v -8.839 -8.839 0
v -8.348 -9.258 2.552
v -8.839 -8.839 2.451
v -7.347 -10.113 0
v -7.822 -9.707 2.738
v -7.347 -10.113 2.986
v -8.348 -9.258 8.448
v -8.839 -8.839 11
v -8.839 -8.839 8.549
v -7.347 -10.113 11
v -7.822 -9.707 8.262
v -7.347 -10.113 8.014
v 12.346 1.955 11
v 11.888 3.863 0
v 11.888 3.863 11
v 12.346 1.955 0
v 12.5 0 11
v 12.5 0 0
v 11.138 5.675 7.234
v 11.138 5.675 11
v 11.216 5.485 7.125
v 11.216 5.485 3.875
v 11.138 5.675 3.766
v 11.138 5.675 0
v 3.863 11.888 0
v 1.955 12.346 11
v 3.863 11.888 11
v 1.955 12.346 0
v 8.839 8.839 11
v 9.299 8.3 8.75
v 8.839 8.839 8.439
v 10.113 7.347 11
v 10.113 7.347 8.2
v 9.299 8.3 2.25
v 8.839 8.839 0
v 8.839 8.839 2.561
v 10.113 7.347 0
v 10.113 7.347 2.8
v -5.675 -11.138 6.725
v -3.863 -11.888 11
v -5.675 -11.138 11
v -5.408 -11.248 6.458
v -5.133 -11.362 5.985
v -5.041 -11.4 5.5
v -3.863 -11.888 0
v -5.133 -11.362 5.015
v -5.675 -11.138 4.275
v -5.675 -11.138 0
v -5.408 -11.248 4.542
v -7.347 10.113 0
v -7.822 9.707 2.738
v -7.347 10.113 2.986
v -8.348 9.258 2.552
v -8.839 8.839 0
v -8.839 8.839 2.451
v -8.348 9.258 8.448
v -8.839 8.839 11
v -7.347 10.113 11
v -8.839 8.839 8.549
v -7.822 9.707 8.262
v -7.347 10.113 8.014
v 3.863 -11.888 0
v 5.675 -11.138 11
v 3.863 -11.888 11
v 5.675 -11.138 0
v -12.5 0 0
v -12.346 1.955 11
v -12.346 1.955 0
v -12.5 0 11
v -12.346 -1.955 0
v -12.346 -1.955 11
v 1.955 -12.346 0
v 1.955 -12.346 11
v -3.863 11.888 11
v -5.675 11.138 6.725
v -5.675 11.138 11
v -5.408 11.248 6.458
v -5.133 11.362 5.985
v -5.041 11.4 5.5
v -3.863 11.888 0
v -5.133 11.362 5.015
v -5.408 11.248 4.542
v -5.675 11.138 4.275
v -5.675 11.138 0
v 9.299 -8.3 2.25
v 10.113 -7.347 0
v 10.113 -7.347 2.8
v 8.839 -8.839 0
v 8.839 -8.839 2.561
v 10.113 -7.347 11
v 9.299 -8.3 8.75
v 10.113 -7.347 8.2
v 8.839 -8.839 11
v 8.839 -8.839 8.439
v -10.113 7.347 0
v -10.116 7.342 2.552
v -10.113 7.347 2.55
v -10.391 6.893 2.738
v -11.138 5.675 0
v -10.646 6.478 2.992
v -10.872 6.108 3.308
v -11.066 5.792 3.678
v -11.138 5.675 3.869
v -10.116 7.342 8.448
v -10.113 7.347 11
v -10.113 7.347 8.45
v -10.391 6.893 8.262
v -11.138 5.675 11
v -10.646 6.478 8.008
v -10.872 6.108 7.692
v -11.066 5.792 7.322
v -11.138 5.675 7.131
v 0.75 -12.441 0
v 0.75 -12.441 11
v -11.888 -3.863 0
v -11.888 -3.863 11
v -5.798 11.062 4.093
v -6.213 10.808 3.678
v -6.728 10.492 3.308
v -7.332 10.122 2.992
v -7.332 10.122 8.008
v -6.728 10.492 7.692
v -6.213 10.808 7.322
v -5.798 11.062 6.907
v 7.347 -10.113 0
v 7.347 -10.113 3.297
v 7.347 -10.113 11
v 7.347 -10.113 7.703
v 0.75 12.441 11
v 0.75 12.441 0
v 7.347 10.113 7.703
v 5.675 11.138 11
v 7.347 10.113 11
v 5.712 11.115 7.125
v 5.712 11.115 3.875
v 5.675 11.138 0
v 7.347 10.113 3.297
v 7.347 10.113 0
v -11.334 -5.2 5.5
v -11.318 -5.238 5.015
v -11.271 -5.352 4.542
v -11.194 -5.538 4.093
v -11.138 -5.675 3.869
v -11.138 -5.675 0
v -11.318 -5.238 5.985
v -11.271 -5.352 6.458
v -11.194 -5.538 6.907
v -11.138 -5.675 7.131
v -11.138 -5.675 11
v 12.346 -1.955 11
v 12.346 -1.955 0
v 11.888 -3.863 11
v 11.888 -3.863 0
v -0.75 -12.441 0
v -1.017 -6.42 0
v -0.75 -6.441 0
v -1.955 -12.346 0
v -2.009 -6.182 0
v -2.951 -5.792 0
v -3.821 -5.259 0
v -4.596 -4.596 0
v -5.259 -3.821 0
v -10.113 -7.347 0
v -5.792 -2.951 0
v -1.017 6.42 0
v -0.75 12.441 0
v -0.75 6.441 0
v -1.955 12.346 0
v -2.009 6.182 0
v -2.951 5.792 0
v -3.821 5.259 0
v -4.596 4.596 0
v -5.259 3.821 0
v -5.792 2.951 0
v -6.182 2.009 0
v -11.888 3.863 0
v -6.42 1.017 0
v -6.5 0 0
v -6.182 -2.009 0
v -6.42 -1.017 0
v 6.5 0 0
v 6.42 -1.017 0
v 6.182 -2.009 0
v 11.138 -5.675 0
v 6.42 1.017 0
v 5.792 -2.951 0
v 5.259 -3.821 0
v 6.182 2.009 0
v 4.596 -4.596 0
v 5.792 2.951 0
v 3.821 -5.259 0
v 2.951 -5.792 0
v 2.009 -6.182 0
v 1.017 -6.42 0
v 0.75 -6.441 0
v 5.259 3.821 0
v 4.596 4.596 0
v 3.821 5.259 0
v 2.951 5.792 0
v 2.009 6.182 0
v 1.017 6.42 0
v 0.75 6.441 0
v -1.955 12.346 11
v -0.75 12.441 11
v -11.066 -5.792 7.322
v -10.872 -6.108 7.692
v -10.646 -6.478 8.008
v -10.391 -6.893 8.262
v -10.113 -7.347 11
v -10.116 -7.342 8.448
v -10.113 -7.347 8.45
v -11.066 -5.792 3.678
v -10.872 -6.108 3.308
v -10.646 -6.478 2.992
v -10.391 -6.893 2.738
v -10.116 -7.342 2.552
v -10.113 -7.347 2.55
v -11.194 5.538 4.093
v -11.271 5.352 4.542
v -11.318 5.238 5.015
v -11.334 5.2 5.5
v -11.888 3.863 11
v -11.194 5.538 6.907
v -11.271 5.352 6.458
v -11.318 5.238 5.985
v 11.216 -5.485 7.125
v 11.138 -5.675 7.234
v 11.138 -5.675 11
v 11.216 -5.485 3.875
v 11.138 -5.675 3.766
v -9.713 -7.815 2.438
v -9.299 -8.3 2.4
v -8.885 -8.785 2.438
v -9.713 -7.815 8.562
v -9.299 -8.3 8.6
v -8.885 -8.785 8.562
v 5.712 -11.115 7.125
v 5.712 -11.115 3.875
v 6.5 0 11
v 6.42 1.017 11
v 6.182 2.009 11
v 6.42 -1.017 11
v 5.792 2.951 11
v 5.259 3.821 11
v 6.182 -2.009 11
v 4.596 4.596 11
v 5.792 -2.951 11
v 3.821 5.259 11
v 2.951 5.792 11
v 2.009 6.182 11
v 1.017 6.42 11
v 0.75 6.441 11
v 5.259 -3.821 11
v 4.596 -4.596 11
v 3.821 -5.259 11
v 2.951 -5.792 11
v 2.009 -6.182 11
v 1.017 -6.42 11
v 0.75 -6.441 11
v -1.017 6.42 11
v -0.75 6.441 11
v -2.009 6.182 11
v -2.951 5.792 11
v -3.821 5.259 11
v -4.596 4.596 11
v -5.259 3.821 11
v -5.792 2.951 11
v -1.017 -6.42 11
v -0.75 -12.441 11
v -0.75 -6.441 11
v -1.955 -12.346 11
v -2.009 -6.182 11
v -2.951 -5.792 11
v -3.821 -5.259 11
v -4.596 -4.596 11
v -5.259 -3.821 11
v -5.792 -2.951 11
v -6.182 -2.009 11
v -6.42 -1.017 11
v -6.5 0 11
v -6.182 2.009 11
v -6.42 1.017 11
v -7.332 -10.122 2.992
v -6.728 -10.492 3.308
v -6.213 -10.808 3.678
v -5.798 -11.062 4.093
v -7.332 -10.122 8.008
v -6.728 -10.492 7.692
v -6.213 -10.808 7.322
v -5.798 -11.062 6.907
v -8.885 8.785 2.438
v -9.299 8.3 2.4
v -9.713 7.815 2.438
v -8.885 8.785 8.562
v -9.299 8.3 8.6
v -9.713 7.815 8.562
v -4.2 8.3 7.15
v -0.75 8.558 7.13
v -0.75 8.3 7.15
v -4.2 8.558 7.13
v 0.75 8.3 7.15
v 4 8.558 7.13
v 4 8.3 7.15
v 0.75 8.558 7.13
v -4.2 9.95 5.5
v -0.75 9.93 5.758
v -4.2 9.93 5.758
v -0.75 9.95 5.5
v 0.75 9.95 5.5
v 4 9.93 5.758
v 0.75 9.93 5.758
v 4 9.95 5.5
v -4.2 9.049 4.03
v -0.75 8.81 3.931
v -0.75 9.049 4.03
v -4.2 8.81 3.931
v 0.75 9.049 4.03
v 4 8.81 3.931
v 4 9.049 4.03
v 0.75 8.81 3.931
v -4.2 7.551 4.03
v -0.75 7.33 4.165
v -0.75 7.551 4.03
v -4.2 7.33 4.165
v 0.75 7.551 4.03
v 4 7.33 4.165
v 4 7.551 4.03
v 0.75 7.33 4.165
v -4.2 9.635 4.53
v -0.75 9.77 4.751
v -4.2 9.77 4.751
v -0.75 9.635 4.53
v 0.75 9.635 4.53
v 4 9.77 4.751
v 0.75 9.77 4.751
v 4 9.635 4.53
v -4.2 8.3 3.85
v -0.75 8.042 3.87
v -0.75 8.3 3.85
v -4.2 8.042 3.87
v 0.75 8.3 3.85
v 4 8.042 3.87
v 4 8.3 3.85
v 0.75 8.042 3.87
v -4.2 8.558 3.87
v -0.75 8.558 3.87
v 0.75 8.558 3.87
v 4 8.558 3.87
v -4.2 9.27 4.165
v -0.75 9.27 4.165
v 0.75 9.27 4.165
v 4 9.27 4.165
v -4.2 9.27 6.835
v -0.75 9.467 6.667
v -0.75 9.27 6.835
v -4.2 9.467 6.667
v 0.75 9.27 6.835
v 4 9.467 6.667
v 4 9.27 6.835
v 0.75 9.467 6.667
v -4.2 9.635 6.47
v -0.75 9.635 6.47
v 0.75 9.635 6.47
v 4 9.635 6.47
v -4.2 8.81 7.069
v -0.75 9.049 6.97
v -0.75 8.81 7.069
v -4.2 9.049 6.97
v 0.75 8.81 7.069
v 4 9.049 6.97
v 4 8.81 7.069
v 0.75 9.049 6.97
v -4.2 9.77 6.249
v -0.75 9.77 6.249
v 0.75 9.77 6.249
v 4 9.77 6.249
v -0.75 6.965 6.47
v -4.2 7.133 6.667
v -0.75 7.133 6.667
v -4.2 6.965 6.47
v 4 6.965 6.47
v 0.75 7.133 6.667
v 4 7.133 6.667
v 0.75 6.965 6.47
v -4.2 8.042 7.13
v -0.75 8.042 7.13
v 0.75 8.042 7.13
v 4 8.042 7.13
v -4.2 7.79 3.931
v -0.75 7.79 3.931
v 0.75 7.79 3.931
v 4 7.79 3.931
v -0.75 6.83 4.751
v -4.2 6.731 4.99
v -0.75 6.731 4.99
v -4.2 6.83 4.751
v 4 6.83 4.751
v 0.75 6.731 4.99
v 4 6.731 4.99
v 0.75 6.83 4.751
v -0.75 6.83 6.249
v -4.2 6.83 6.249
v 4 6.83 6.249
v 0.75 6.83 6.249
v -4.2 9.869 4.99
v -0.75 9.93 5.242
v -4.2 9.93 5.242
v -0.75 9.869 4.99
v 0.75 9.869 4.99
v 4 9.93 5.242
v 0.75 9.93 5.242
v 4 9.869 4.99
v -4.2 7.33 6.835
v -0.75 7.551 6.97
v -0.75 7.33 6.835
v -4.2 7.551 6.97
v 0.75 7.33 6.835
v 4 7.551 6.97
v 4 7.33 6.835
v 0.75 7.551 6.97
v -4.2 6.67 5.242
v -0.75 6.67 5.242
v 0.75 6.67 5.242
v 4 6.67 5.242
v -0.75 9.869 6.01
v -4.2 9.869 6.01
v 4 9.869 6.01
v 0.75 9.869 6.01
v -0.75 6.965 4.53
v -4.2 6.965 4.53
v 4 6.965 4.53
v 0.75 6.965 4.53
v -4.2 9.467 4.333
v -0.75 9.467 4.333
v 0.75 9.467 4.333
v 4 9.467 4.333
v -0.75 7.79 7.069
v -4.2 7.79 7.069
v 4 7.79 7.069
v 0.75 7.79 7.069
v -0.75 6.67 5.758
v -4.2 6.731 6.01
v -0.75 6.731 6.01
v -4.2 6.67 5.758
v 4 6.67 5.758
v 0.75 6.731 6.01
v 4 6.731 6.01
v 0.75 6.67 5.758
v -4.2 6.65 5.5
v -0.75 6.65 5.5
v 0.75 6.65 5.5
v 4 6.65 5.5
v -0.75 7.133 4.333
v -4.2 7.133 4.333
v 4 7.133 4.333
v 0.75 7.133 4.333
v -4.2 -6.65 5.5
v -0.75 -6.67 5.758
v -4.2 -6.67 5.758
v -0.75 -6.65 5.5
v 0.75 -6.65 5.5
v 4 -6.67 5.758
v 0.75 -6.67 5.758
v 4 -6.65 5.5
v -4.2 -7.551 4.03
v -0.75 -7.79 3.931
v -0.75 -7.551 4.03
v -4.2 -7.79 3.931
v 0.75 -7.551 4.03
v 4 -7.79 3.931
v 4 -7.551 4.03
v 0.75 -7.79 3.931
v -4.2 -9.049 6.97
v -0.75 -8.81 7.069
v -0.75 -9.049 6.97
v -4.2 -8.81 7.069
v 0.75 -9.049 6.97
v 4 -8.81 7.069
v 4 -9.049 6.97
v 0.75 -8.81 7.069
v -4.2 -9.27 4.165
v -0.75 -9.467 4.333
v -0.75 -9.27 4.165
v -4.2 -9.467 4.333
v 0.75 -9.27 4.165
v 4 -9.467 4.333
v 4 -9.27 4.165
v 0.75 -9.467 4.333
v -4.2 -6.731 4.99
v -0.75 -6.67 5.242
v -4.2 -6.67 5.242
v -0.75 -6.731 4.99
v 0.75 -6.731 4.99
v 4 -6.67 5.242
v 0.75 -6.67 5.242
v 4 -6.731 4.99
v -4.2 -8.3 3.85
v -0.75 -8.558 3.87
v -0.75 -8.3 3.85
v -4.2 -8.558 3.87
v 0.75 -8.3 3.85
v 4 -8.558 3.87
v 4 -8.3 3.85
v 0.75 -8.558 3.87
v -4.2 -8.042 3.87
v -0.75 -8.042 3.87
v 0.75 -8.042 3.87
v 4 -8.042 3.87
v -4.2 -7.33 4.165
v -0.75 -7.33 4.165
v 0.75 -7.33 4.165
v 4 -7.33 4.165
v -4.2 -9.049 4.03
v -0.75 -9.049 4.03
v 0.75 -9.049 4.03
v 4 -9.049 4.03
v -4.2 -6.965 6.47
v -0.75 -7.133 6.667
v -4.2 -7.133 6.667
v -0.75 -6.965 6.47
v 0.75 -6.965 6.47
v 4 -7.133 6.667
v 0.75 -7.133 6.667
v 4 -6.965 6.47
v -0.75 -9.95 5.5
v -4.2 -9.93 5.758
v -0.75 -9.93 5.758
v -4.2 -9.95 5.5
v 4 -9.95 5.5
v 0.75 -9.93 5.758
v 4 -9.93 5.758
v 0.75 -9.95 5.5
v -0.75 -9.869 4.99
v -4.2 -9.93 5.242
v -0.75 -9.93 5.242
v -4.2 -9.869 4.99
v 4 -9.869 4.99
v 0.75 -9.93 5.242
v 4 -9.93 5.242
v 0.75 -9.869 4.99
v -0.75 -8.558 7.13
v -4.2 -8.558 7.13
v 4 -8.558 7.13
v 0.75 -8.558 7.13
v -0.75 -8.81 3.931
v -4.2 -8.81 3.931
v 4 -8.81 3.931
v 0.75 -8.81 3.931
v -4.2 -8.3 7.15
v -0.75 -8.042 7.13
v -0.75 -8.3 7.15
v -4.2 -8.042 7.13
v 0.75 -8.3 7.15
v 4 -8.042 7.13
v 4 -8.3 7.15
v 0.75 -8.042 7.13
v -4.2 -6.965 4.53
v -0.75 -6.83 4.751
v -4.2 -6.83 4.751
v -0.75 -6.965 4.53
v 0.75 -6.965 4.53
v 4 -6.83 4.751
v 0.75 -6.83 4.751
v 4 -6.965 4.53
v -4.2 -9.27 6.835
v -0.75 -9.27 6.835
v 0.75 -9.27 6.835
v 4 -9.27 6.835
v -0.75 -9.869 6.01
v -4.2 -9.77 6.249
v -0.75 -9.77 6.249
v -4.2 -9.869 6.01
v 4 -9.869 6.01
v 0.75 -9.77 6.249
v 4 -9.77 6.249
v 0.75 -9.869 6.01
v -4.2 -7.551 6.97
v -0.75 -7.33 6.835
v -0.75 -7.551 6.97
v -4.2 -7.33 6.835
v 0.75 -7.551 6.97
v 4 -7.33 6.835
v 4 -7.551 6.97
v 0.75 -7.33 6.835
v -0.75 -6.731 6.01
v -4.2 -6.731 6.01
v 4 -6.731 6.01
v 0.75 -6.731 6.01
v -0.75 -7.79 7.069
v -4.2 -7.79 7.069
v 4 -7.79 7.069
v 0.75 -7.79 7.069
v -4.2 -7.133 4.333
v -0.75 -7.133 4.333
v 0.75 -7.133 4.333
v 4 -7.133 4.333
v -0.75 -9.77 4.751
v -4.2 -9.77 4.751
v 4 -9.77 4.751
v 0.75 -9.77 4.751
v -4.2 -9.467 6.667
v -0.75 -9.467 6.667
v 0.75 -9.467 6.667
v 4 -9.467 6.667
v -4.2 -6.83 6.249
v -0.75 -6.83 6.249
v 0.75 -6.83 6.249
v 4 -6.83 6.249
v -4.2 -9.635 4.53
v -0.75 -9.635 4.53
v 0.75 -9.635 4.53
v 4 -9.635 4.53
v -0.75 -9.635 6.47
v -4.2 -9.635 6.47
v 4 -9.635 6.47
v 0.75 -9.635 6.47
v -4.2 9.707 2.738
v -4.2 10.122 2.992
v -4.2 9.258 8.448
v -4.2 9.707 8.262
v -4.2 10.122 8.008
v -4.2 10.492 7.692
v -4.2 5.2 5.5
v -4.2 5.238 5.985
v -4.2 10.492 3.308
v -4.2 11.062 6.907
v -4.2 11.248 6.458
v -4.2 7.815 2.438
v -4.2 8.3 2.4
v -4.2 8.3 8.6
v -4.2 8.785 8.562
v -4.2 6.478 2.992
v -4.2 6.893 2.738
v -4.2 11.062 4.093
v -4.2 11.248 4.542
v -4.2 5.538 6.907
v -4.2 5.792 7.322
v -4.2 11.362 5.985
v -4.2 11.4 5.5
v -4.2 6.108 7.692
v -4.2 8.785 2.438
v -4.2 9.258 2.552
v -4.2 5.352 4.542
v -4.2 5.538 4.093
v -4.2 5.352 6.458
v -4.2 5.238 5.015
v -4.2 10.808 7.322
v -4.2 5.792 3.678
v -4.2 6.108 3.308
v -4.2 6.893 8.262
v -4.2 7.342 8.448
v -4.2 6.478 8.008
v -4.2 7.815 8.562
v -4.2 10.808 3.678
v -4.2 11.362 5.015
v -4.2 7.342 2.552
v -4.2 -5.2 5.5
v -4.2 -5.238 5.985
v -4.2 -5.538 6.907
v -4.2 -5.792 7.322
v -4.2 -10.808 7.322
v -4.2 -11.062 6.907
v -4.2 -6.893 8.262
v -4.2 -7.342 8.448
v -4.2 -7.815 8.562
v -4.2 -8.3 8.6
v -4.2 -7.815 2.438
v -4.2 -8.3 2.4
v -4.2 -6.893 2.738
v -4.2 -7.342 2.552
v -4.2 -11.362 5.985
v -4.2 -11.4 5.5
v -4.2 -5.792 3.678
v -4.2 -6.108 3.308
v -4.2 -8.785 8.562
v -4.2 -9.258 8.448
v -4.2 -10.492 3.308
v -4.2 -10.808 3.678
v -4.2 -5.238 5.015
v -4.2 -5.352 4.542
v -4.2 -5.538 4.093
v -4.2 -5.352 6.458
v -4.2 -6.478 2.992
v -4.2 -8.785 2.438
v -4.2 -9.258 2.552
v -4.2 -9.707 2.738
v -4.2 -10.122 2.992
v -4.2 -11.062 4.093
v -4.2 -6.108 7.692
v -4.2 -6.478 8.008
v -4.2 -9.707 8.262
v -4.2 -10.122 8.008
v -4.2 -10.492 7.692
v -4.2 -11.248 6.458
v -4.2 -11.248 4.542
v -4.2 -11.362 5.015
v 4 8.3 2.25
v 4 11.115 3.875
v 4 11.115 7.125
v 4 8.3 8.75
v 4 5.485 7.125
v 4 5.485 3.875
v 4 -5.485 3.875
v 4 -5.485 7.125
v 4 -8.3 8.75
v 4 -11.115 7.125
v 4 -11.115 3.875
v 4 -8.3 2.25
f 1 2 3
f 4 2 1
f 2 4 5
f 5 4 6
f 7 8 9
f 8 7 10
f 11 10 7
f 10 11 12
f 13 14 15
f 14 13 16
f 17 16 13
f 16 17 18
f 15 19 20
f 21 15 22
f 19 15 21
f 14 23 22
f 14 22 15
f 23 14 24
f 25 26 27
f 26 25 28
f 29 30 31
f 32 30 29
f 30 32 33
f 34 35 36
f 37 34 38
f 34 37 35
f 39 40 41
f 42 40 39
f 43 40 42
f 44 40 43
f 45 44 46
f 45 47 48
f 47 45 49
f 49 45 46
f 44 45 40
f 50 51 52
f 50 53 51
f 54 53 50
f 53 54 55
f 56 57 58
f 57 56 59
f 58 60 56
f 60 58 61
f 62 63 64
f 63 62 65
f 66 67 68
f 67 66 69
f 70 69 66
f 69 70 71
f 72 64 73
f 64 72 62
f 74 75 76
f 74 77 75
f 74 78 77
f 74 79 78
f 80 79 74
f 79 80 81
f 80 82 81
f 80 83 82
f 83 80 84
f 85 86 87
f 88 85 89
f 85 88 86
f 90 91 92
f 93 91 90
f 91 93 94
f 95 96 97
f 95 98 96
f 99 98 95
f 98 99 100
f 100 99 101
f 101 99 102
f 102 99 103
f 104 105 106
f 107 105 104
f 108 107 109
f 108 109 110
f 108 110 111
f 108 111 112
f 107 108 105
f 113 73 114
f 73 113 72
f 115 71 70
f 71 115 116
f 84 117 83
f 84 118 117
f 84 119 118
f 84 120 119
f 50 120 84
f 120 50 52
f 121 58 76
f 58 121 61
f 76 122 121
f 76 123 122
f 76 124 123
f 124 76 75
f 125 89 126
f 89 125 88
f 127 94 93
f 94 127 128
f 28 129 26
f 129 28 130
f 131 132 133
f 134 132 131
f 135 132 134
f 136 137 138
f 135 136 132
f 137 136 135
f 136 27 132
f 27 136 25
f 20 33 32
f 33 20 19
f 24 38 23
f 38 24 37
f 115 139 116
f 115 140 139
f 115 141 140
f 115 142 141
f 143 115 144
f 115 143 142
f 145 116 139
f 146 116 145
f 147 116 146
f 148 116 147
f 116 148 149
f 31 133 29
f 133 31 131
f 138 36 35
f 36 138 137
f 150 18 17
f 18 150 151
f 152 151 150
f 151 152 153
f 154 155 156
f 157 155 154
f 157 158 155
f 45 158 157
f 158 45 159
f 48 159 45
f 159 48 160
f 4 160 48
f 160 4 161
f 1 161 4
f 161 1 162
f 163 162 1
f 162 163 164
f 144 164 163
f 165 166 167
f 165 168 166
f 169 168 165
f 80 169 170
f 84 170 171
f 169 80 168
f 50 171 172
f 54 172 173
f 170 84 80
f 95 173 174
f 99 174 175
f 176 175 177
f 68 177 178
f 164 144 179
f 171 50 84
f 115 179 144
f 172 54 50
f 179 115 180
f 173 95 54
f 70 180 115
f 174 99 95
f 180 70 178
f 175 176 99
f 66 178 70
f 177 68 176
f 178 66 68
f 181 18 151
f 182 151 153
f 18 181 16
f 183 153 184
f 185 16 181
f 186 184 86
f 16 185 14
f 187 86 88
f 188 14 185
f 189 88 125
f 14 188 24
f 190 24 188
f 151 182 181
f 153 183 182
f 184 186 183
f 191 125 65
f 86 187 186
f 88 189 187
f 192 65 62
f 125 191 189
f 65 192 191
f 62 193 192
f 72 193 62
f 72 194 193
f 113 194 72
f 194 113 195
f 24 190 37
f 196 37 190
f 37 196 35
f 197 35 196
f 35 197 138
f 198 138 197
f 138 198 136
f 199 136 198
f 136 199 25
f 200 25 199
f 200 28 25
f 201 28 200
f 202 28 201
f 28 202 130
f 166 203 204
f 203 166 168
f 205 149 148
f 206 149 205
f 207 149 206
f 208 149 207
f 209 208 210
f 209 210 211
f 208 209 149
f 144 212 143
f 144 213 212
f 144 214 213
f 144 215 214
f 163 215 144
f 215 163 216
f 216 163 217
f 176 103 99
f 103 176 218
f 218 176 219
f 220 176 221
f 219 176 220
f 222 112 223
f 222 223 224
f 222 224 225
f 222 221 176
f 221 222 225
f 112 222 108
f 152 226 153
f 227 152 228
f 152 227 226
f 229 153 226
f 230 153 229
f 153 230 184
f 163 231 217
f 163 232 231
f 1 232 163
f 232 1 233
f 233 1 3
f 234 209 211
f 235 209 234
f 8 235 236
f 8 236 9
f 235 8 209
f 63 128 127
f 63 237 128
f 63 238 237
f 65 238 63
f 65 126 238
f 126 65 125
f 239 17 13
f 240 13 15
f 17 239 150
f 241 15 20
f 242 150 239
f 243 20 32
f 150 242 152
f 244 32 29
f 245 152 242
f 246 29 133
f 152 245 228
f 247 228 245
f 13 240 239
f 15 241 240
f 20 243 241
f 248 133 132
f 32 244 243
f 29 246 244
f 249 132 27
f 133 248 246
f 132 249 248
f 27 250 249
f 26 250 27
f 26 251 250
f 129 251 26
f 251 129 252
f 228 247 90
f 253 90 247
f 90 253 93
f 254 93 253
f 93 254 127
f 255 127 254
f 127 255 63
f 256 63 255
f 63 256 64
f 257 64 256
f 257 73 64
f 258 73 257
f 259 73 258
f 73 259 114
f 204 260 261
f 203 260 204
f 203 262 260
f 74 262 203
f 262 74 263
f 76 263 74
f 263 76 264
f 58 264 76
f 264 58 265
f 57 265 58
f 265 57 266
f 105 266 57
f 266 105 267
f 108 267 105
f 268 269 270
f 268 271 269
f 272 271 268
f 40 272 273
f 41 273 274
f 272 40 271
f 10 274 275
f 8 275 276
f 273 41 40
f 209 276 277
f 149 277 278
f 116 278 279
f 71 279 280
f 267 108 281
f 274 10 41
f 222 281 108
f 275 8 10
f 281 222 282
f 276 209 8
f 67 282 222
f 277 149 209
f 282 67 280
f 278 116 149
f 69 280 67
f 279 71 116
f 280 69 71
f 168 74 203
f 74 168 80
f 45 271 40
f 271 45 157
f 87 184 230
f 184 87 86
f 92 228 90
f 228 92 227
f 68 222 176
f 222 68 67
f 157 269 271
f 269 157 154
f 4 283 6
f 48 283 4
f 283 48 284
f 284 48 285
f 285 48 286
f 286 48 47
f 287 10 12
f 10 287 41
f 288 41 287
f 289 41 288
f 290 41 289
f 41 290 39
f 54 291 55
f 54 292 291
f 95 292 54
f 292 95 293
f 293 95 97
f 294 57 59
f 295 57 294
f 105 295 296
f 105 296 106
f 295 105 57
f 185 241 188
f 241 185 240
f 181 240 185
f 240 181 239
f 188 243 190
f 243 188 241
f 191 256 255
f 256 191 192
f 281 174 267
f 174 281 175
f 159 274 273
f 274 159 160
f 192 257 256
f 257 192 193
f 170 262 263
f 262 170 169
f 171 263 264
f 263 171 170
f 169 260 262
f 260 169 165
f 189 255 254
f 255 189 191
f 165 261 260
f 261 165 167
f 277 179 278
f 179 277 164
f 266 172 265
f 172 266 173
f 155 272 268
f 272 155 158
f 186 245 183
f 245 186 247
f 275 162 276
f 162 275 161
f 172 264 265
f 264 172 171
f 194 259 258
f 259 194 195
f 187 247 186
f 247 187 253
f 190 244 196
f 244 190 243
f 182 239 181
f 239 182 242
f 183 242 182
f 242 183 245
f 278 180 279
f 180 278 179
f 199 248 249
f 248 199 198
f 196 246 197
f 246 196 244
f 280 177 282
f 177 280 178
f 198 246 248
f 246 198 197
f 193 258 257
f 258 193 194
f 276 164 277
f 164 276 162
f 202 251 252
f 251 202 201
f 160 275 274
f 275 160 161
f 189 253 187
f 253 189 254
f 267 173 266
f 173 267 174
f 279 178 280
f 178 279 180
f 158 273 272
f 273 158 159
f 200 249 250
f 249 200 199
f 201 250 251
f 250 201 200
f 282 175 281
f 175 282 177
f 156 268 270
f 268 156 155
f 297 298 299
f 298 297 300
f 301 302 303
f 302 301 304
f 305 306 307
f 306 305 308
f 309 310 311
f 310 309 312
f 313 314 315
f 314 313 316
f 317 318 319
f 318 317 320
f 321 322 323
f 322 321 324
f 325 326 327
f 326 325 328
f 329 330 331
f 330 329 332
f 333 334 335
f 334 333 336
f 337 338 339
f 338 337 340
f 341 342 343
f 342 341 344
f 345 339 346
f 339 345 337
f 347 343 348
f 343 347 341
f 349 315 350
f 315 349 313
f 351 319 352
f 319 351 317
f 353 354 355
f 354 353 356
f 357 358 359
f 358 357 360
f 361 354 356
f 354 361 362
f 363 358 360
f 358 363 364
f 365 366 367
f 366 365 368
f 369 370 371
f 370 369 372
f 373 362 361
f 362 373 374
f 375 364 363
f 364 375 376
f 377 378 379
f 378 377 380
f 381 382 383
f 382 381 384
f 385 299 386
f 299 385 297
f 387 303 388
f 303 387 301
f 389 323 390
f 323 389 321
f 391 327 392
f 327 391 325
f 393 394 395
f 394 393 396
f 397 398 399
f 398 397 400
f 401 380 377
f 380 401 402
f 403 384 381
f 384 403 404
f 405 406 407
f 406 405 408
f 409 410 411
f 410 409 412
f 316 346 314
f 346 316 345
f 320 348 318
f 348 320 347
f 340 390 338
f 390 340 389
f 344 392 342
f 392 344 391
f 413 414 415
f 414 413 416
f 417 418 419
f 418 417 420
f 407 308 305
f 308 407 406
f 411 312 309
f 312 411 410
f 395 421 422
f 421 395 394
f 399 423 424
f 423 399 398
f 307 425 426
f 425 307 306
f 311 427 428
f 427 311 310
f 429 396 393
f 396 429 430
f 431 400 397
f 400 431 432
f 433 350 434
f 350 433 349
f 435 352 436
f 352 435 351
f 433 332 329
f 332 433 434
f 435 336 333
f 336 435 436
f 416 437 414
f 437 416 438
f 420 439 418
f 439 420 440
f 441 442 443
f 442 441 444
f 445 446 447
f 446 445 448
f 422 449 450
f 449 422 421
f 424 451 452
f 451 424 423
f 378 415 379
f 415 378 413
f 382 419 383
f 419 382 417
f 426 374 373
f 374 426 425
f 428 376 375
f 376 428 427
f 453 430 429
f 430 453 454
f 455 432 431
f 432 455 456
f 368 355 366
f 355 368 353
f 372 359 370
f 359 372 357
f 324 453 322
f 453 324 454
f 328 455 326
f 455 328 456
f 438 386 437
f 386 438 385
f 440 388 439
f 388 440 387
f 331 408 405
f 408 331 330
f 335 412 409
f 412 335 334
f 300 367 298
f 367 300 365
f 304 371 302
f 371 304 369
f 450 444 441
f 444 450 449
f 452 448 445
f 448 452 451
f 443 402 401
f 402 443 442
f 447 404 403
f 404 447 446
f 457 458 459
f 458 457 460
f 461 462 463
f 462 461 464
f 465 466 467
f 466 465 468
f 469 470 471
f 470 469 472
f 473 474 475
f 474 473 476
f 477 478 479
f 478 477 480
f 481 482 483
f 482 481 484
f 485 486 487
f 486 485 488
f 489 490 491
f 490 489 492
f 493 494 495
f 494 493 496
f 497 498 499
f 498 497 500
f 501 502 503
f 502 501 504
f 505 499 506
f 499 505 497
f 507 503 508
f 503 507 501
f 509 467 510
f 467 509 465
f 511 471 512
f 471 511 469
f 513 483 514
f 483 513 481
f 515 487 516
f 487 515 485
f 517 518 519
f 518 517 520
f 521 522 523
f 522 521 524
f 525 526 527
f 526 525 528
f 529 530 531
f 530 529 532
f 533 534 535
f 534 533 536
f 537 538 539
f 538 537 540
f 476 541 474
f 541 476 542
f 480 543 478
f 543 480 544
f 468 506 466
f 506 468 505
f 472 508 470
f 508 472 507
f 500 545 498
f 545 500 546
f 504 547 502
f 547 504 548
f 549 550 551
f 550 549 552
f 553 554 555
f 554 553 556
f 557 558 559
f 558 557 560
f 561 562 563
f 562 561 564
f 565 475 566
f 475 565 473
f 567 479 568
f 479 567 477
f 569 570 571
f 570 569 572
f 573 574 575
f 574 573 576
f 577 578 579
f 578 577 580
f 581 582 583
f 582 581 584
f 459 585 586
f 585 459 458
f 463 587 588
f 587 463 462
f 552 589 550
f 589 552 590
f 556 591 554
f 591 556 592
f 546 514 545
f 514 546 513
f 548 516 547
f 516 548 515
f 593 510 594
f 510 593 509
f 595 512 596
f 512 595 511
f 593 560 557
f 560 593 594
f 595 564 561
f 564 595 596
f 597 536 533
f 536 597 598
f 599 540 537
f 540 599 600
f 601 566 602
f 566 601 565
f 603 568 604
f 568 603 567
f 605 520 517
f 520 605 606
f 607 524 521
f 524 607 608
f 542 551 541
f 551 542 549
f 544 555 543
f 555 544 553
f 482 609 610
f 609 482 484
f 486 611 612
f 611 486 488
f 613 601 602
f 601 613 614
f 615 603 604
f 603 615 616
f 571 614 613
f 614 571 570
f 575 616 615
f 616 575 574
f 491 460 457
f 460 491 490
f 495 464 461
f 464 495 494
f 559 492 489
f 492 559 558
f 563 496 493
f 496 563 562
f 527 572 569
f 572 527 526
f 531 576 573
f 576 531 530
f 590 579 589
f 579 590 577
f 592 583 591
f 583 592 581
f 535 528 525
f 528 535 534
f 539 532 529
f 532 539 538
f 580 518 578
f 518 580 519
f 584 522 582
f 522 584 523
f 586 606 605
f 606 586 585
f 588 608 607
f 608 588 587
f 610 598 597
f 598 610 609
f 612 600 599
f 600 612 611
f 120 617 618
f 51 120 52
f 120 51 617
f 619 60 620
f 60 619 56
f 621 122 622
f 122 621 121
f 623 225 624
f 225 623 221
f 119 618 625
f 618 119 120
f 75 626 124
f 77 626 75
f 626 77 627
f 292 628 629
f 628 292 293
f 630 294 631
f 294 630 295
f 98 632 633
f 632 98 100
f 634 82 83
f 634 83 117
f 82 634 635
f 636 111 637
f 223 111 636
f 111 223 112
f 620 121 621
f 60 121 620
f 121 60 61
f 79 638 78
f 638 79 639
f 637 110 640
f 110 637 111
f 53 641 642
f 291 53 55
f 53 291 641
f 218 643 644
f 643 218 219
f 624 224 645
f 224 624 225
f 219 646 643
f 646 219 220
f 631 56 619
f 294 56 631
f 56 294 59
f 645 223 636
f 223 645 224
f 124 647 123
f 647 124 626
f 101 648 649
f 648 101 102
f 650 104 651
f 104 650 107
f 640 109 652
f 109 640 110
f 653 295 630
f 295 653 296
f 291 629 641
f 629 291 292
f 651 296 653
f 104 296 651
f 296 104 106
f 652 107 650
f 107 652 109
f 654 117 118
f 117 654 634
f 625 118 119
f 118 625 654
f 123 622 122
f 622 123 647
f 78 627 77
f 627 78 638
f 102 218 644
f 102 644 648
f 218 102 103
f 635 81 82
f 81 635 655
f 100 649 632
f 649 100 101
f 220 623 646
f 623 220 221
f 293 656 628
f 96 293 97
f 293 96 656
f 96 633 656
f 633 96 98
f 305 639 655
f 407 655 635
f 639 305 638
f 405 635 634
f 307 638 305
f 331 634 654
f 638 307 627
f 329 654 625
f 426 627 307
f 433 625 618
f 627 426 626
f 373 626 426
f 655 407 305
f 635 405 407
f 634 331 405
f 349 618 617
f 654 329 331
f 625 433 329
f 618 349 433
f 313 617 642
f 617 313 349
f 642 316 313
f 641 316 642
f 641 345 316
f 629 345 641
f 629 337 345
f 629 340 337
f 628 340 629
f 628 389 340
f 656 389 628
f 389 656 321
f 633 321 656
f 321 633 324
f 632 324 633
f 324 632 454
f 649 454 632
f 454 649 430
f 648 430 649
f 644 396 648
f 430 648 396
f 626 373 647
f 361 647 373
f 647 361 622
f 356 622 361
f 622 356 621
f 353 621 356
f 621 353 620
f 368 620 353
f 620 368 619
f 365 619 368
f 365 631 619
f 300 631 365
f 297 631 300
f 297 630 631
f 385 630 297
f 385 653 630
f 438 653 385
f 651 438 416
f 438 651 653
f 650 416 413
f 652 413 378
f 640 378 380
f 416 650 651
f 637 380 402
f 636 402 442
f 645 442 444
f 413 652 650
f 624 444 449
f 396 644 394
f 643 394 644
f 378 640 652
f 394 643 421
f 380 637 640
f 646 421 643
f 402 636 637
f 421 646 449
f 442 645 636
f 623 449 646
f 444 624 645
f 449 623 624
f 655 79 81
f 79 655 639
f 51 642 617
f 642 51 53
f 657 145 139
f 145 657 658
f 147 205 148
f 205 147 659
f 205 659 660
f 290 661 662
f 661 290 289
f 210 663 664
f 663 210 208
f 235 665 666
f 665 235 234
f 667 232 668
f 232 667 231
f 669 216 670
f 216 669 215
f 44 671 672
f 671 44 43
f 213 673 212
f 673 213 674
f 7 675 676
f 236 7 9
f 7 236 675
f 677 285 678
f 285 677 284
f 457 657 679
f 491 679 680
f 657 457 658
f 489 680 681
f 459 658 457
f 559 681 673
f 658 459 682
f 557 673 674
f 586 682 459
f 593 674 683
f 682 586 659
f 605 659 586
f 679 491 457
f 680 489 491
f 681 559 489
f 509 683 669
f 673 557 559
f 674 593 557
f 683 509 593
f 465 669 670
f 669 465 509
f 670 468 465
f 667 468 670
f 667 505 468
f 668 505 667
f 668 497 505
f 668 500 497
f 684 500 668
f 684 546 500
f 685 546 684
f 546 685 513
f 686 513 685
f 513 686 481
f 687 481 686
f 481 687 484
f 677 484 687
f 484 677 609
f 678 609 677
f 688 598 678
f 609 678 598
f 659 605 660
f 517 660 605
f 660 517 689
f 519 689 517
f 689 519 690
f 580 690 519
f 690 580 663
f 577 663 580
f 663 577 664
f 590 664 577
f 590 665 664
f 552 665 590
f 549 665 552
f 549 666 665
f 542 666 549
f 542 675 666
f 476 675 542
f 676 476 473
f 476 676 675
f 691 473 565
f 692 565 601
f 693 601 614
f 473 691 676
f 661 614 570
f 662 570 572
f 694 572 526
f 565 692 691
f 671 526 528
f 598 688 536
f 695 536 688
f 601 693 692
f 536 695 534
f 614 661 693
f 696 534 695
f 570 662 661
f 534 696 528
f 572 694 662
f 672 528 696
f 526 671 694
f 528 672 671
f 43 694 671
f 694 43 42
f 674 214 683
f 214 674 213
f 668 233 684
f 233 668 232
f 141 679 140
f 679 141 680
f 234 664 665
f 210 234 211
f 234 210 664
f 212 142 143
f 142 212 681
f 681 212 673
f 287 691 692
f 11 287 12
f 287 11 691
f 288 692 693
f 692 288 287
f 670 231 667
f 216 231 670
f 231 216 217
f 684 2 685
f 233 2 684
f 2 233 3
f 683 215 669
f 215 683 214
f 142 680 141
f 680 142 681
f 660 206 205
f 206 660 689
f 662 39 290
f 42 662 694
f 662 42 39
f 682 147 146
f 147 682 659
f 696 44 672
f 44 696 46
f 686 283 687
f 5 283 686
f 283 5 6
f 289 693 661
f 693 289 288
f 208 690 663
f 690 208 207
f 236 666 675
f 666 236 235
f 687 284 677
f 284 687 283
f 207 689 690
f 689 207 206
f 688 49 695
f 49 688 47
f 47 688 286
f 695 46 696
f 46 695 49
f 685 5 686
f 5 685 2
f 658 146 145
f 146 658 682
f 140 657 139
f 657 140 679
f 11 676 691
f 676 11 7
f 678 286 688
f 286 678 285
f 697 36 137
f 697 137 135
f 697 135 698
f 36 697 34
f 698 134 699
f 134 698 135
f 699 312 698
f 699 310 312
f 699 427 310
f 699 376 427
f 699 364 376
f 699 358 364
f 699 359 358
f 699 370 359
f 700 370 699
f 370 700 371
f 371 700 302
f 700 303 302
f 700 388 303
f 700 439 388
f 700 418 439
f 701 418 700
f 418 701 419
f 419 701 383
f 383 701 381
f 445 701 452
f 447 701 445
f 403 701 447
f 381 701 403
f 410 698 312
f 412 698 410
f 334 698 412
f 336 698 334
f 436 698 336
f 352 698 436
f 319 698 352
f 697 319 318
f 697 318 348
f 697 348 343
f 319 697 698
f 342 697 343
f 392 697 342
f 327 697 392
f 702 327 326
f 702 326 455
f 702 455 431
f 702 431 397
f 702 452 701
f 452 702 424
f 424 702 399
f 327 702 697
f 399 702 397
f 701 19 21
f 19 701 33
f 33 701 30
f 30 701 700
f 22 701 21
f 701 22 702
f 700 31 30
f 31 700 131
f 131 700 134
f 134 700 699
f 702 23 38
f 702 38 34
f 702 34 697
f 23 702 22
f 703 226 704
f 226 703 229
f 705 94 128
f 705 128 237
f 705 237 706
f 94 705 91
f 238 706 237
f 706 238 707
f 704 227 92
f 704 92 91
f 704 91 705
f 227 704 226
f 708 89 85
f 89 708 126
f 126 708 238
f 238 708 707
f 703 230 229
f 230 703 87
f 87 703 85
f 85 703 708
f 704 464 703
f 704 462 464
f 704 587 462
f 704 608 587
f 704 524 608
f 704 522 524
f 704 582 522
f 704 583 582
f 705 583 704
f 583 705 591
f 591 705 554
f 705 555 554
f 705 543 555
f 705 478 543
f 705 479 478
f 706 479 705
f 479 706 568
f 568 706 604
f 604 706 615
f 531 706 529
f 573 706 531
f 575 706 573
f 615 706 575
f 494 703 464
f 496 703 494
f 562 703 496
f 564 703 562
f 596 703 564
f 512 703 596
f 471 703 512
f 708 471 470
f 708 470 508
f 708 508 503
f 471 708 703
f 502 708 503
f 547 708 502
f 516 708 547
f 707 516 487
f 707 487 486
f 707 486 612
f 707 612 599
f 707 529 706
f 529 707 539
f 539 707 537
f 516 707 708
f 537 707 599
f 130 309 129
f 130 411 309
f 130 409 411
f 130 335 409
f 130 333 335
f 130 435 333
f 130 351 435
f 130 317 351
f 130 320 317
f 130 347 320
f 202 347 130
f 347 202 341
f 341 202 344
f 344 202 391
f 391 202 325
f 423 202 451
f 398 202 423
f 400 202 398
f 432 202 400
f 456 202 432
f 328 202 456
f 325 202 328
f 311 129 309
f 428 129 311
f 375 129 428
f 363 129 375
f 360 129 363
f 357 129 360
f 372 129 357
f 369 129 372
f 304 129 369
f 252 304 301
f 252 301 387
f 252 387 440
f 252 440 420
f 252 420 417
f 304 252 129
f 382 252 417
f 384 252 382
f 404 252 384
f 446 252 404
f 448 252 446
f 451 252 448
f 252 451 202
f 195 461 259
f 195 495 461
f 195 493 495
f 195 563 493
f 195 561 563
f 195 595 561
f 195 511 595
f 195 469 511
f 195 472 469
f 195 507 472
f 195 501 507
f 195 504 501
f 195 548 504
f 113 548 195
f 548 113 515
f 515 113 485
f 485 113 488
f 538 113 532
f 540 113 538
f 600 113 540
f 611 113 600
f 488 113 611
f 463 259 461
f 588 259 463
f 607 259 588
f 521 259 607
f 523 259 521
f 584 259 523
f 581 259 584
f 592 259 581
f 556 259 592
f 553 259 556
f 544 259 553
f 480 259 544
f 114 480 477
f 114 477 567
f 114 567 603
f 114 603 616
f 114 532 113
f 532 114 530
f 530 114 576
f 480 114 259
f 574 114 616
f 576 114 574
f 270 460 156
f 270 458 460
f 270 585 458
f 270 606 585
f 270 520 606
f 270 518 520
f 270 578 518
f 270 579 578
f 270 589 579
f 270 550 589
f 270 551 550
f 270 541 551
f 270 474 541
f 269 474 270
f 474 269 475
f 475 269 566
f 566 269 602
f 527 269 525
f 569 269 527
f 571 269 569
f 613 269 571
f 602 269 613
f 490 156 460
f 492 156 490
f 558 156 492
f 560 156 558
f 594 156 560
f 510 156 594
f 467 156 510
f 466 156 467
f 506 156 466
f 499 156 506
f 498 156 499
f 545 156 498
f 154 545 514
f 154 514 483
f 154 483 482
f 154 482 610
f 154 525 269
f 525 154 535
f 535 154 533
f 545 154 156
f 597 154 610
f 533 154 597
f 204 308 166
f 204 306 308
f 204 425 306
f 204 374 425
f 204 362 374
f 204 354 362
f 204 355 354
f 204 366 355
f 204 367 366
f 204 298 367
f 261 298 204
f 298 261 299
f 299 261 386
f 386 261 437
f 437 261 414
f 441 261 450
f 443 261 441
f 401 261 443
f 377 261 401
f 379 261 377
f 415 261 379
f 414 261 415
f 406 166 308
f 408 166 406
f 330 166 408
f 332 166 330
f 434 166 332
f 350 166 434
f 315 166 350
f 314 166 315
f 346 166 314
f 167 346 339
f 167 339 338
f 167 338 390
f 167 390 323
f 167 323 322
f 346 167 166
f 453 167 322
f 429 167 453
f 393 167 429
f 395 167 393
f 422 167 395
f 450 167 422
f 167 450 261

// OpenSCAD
// file: globals.scad
/*
Most things in this file is represented as one millimeter, so keep that in mind while changing things.
Some of the setting are not mm but at variables that you can set, such as 2*x=2x and you are setting what x is.
I will try to specify when things are variables and not exact measurements.
*/

// printer slop
slop = 0.15;

obj_leg = 30;
leg_length = 5.5;
small_number = 0.001;
metal_core_rode_global = 5;


///////////////// number of holes /////////////////////
z_hole_number = 8;
other_holes = 8;

///////////////// Pins /////////////////////

//pins that poke out
ball_size = 10;
pin_height = 20;
pin_diameter = 6;


//holes
hole_ball_size = ball_size;
hole_pin_height = pin_height;
hole_pin_diameter = pin_diameter;

///////////////// Z THINGS /////////////////////

berring_slot_width = 7.5;
berring_slot_depth = 6.5;
metal_core_rode = 5;

///////////////// X THINGS /////////////////////

//male dove tails
male_dove_max_width=8;
male_dove_min_width=5;
male_dove_depth=5;
male_dove_height=obj_leg/2;

function scaled_male_dove_max_width() = male_dove_max_width;
function scaled_male_dove_min_width() = male_dove_min_width - 0.5*slop;
function scaled_male_dove_depth() = male_dove_depth - .2;

//female dove tails, this is found on the y mounts
girl_max_width=11;
girl_min_width=5;
girl_depth=5;
girl_height=obj_leg;


///////////////// Y THINGS /////////////////////
/*
The Y is so normal that all of those global variables at the top should change all of the setting in it, this section is set her incase there are variables set in the future development of this project.
*/

// stepper
motor_side_length = 43.2;
motor_bolt_hole_distance = 31;
motor_center_hole = 23;
motor_shaft_dia = 5;
motor_shaft_hole_dia = 5;

// bolts etc.
bolt_hole_dia = 3+2*slop;
bolt_head_hole_dia = 6.2;

m4_bolt_hole_dia = 4+2*slop;
m4_bolt_head_hole_dia = 6.8+2*slop;

m3_nut_side = 5.65;
m3_nut_height = 2.3;
m4_nut_side = 6.85;
m4_nut_height = 3.1;

// threaded rod
lifter_rod_diam = 9.86;
hole_threaded_rod = lifter_rod_diam+2*slop;

// for the extensions
metal_rod_size = 9;

// z screw
z_screw_d = 25;

// stabilizer
pin_bolt_dia = 12-2*slop;
pin_bolt_dia_minus = 12+2*slop;

clip_bolt_dia = 10-2*slop;
clip_bolt_dia_minus = 10+2*slop;
// main file
include <globals.scad>;
include <include.scad>;

$fn=40;

height = 32;

// A rigid clamp for leadscrew. Uses 3mm bolts and nuts to tighten
module rigid_leadscrew_coupler () {
    module body() {
        union() {
            difference() {
                cylinder(d=30, h=height);
                translate([0,0,height/2]) cylinder(d=hole_threaded_rod, h=height/2+1);
                motor_shaft(height/2+1);
                // bolt holes
                translate([-height/2,9,5]) rotate([0,90,0]) cylinder(d=bolt_hole_dia, h=height);
                translate([-height/2,-9,5]) rotate([0,90,0]) cylinder(d=bolt_hole_dia, h=height);
            
                translate([9,height/2,27]) rotate([90,0,0]) cylinder(d=bolt_hole_dia, h=height);
                translate([-9,height/2,27]) rotate([90,0,0]) cylinder(d=bolt_hole_dia, h=height);

                // bolt head holes
                translate([-height/2,9,5]) rotate([0,90,0]) cylinder(d=bolt_head_hole_dia, h=9);
                translate([-height/2,-9,5]) rotate([0,90,0]) cylinder(d=bolt_head_hole_dia, h=9);
            
                translate([9,height/2,27]) rotate([90,0,0]) cylinder(d=bolt_head_hole_dia, h=9);
                translate([-9,height/2,27]) rotate([90,0,0]) cylinder(d=bolt_head_hole_dia, h=9);

                // nut holes
                translate([8,9,5]) rotate([0,90,0]) M3_nut(6);
                translate([8,-9,5]) rotate([0,90,0]) M3_nut(6);

                translate([9,-8,27]) rotate([90,0,0]) M3_nut(6);
                translate([-9,-8,27]) rotate([90,0,0]) M3_nut(6);
            }
            
        }
        
        module throat() {
            translate([-0.7,4.2,height/2+1]) rotate([-5,0,0]) cube([1,3,10]);
        }
        rotate([0,0,45]) throat();
        rotate([0,0,135]) throat();
        rotate([0,0,225]) throat();
        rotate([0,0,315]) throat();
            
    }

    difference() {
        body();
        translate([-1,-height/2,0]) cube([2, height, height/2]);
        translate([-height/2,-1,height/2]) cube([height, 2, height/2]);
    }
}

// Flexible coupler motor shaft adapter. 10mm outer diameter
module motor_shaft_adapter() {
    difference() {
        ridged_cylinder(d=10, h=15, r=3);
        motor_shaft(16, extra_slop=slop);
        rotate([0,0,180]) translate([-0.5,0,0]) cube([1, 8, 15]);
    }
}

flex_wall = 2.2;
flex_thread_d = 10+2*flex_wall+2;

// Fexible coupler tube. Print ith flexible filament or use silicon tube instead
module flexible_coupler_tube(h=32) {
    difference() {
        union() {
            cylinder(d=10+2*flex_wall, h=h);
            _threads(d=flex_thread_d, h=h, z_step=2, depth=0.7, direction=0);
        }
        ridged_cylinder(d=10, h=h+1, r=3);
    }
}

// Clamp for flexible coupler. Uses m3 bolts and nuts to tighten
module flexible_coupler_clamp() {
    
    h = 11;
    
    // clamp
    module clamp() {
        difference() {
            cylinder(d=25, h=h);
            cylinder(d=13, h=h);

            // bolt holes
            translate([-height/2,8.3,h/2]) rotate([0,90,0]) cylinder(d=bolt_hole_dia, h=height);
            translate([-height/2,-8.3,h/2]) rotate([0,90,0]) cylinder(d=bolt_hole_dia, h=height);
    
            // bolt head holes
            translate([-4.2,8.3,h/2]) rotate([0,-90,0]) cylinder(d=bolt_head_hole_dia, h=9);
            translate([-4.2,-8.3,h/2]) rotate([0,-90,0]) cylinder(d=bolt_head_hole_dia, h=9);
        
            // nut holes
            translate([4,8.3,h/2]) rotate([0,90,0]) M3_nut(8);
            translate([4,-8.3,h/2]) rotate([0,90,0]) M3_nut(8);
        
            translate([-1.5/2,-height/2,0]) cube([1.5, height, height/2]);
        }
    }
    clamp();
}

// Nut for tightening the flexible coupler. Screw over the flexible tube
module flexible_coupler_nut(hex=false) {
    d = 21;
    t_d = flex_thread_d+0.4;
    difference() {
        if (hex == false) {
            cylinder(d=d, h=8);
        } else {
            cylinder(d=d+1, h=8, $fn=6);
        }
        _threads(d=t_d, h=11, z_step=2, depth=0.7, direction=0);

        if (hex == false) {
            for (i = [0:3]) {
                translate([0,0,i*2+1]) cube_donut(d+6.5, 5);
            }
            steps = round(PI*d/2);
            step_angle = 360/steps;
            for(i = [0:steps-1]) {
                rotate([0,0,i*step_angle]) translate([d/2,0,0]) rotate([0,0,45]) cube([0.5,0.5, 30], center=true);
            }
        }
    }
}

module debug() {
    intersection() {
        union() {
            flexible_coupler_tube();
            flexible_coupler_nut(hex=true);
        }
        cube([100,100,100]);
    }
}

module debug_flexible_coupler_clamp() {
    intersection() {
        flexible_coupler_clamp();
        translate([-30,-15,0]) cube([30,30,5]);
    }
}

//debug();
//debug_flexible_coupler_clamp();

//rigid_leadscrew_coupler();
flexible_coupler_clamp();
//motor_shaft_adapter();
//flexible_coupler_tube();
//flexible_coupler_nut(hex=true);
//flexible_coupler_nut(hex=false);
